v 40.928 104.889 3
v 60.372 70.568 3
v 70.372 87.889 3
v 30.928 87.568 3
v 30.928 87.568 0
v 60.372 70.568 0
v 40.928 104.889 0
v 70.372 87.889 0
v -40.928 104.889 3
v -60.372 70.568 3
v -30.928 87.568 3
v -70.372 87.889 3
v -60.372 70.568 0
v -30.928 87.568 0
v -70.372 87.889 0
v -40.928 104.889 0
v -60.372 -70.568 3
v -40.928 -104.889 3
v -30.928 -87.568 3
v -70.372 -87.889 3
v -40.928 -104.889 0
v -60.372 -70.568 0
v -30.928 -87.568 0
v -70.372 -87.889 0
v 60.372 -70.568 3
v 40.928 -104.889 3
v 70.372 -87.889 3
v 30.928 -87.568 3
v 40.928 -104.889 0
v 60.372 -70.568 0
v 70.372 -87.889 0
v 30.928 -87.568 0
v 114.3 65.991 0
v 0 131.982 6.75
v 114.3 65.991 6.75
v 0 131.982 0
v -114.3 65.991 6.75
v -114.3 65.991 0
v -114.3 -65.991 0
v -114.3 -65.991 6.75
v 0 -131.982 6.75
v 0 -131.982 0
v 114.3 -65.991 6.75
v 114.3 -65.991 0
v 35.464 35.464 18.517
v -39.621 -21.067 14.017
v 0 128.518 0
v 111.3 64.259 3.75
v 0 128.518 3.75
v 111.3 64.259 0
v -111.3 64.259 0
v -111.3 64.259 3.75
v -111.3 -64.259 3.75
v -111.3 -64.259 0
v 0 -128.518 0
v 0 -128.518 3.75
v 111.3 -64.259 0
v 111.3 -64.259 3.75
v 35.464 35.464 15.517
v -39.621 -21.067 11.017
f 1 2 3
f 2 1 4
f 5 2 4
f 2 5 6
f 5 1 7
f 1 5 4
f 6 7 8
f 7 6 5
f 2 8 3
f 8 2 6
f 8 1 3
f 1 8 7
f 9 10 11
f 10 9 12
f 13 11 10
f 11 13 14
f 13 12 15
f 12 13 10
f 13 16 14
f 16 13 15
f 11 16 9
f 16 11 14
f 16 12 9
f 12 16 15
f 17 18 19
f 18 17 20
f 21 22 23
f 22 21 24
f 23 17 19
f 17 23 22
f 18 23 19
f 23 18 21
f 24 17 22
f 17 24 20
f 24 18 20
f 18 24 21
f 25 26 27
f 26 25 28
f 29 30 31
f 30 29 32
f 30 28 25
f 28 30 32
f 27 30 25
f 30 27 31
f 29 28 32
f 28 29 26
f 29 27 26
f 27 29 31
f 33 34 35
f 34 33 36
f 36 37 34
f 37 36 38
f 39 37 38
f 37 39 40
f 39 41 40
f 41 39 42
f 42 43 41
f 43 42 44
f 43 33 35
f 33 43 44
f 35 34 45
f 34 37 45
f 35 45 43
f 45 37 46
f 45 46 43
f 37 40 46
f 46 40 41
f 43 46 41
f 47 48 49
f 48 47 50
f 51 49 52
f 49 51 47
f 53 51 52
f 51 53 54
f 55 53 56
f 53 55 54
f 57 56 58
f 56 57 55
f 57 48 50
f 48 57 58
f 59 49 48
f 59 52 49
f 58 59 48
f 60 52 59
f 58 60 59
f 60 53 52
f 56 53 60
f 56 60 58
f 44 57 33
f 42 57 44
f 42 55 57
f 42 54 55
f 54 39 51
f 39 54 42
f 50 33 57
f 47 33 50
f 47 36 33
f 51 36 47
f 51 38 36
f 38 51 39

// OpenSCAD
/*
    parametric_faceted_hex_wall_tile_mount_v22_hidden_tabs.scad
    ------------------------------------------------------------
    Improved asymmetric low-poly hex wall tile.

    Major v22 changes
    -----------------
    1. ONE master thickness control drives the whole part:
       master_thickness_mm

    2. FIXED mounting tabs showing through the front face.
       - edge height now automatically provides enough cavity depth
         for the full mounting-pad thickness
       - mounting tabs and ribs are also clipped against a safe volume
         below the underside of the faceted front shell
       - tabs therefore remain hidden inside the tile


       It controls:
       - faceted front shell thickness
       - perimeter wall thickness
       - mounting-tab thickness

       Optional multipliers allow advanced tuning without hiding the
       master control.

    2. Thicker shells now work automatically.
       The effective edge height is automatically raised when required
       so shell_thickness_mm is never blocked by a too-small edge height.

    3. Mounting pads cannot protrude outside the hexagon.
       Pads are intersected with a smaller inset hex footprint.

    4. Stronger default mounting geometry.
       - 3.0 mm pad thickness
       - 4.0 mm shell overlap
       - 3.0 mm edge inset
       - optional reinforcing ribs

    5. Open back remains truly open.
       There is no rear floor across the middle.

    Recommended use
    ---------------
    For a 9-inch decorative wall tile printed vertically:

        master_thickness_mm        = 3.0;
        front_shell_multiplier      = 1.0;
        perimeter_multiplier        = 1.0;
        mount_pad_multiplier        = 1.0;
        mount_pad_overlap_mm        = 4.0;
        mount_pad_edge_inset_mm     = 3.0;
        add_mount_ribs              = true;

    Export
    ------
    F6 Render
    File -> Export -> Export as STL
*/


// =============================================================================
// CUSTOMIZER PARAMETERS
// =============================================================================


/* [Tile Size] */

// Which dimension tile_size represents.
size_reference = "flat_to_flat";     // [flat_to_flat, across_corners]

// Units for tile_size.
size_units = "mm";                   // [mm, in]

// Examples:
// 152.4 = 6"
// 203.2 = 8"
// 228.6 = 9"
// 254.0 = 10"
tile_size = 228.6;

// Rotate finished tile around Z.
tile_rotation_deg = 0;


/* [MASTER THICKNESS] */

// MASTER MATERIAL THICKNESS.
//
// THIS is the main control to use if you want the whole printed part
// physically thicker / stronger.
//
// It directly drives:
//   - faceted front shell thickness
//   - perimeter wall thickness
//   - mounting pad thickness
//
// Recommended:
//   1.6 = light
//   2.0 = medium
//   2.5 = strong
//   3.0 = very strong / recommended for a robust wall tile
//   3.5 = heavy duty
//
master_thickness_mm = 3.0;

// Optional multipliers.
//
// Leave these at 1.0 unless you deliberately want one area stronger
// than the master value.
//
// Example:
// perimeter_multiplier = 1.20 makes a 3.0 mm master produce a
// 3.6 mm perimeter.
front_shell_multiplier = 1.0;
perimeter_multiplier   = 1.0;
mount_pad_multiplier   = 1.0;

// Derived thicknesses are calculated later from the master control.


/* [Front Relief] */

// proportional = scales with tile size
// absolute     = exact millimeter heights below
relief_height_mode = "proportional";    // [proportional, absolute]

// Overall relief multiplier.
relief_scale = 1.0;

// Main peak height relative to flat-to-flat size.
peak_height_ratio = 0.081;

// Ridge height relative to peak.
ridge_to_peak_ratio = 0.757;

// Requested outer edge height relative to peak.
//
// IMPORTANT:
// v21 automatically raises edge height if necessary to fit the selected
// front shell thickness. You normally do NOT need to change this anymore.
edge_to_peak_ratio = 0.097;

// Absolute values, used only in absolute mode.
peak_height_mm  = 18.5;
ridge_height_mm = 14.0;
edge_height_mm  = 1.8;

// Minimum empty clearance between the inner roof and Z=0 at the perimeter.
//
// v20 uses:
// effective_edge_height >= front_shell_thickness_mm + edge_clearance_mm
edge_clearance_mm = 0.60;


/* [Facet Layout] */

// Direction of main peak, CCW from +X.
peak_angle_deg = 45;

// Peak distance from center as a fraction of circumradius.
peak_radius_ratio = 0.38;

// Direction of secondary ridge.
ridge_angle_deg = 208;

// Ridge radial position.
ridge_radius_ratio = 0.34;


/* [Wall Mounting] */

// Enable mounting pads.
add_mount_pads = true;

// Width of each pad parallel to the corresponding hex side.
mount_pad_width_mm = 34.0;

// Radial depth of each pad.
mount_pad_depth_mm = 24.0;

// Mounting-tab thickness is now driven by master_thickness_mm.
// Use mount_pad_multiplier above only if the tabs need to be thicker
// or thinner than the rest of the tile.

// How far the pad reaches beneath the inner perimeter shell.
//
// More overlap creates a stronger pad-to-rim union.
mount_pad_overlap_mm = 4.0;

// Pull the ENTIRE usable pad footprint inward from the outside hex edge.
//
// Pads are clipped against this inset hex, so they cannot protrude outside.
mount_pad_edge_inset_mm = 3.0;

// Minimum air gap between the TOP of mounting geometry and the
// UNDERSIDE of the faceted front shell.
//
// This prevents tabs/ribs from becoming visible through the face.
// Recommended: 0.50-1.00 mm.
mount_face_clearance_mm = 0.75;

// Directions of mounting pads.
mount_pad_angles = [60, 120, 240, 300];


/* [Mount Reinforcement] */

// Add small triangular reinforcing ribs where pads meet the perimeter.
//
// Recommended ON for vertical printing.
add_mount_ribs = false;

// Rib thickness across the pad.
mount_rib_width_mm = 3.0;

// Rib height into the cavity.
mount_rib_height_mm = 5.0;

// Rib radial depth.
mount_rib_depth_mm = 8.0;


/* [Optional Screw Holes] */

add_pad_screw_holes = false;

// 3.5 ~= #6
// 4.5 ~= #8
pad_screw_hole_diameter_mm = 4.5;


/* [Advanced] */

// Polyhedron preview hint.
polyhedron_convexity = 12;

// Cylinder quality for screw holes.
screw_hole_fn = 40;


// =============================================================================
// DERIVED MATERIAL THICKNESSES
// =============================================================================
//
// These are the ACTUAL thicknesses used by the model.
//

front_shell_thickness_mm =
    master_thickness_mm * front_shell_multiplier;

perimeter_wall_thickness_mm =
    master_thickness_mm * perimeter_multiplier;

mount_pad_thickness_mm =
    master_thickness_mm * mount_pad_multiplier;


// =============================================================================
// DERIVED TILE DIMENSIONS
// =============================================================================

_tile_size_mm =
    size_units == "in"
        ? tile_size * 25.4
        : tile_size;

tile_flat_to_flat =
    size_reference == "flat_to_flat"
        ? _tile_size_mm
        : _tile_size_mm * cos(30);

tile_across_corners =
    tile_flat_to_flat / cos(30);

outer_apothem =
    tile_flat_to_flat / 2;

r_outer =
    outer_apothem / cos(30);

inner_apothem =
    outer_apothem - perimeter_wall_thickness_mm;

r_inner =
    inner_apothem / cos(30);

inner_flat_length =
    2 * inner_apothem * tan(30);

hex_side_length =
    2 * r_outer * sin(30);


// =============================================================================
// DERIVED RELIEF HEIGHTS
// =============================================================================

_peak_unscaled =
    relief_height_mode == "proportional"
        ? tile_flat_to_flat * peak_height_ratio
        : peak_height_mm;

_ridge_unscaled =
    relief_height_mode == "proportional"
        ? _peak_unscaled * ridge_to_peak_ratio
        : ridge_height_mm;

_requested_edge_unscaled =
    relief_height_mode == "proportional"
        ? _peak_unscaled * edge_to_peak_ratio
        : edge_height_mm;

peak_height =
    _peak_unscaled * relief_scale;

ridge_height =
    _ridge_unscaled * relief_scale;

requested_edge_height =
    _requested_edge_unscaled * relief_scale;

// AUTO-FIX:
// Guarantee enough vertical room for BOTH:
//   1. the chosen front-shell thickness
//   2. the full mounting-pad thickness
//
// This is the key v22 fix for tabs previously breaking through the face.
minimum_edge_height =
    front_shell_thickness_mm
    + mount_pad_thickness_mm
    + mount_face_clearance_mm;

edge_height =
    max(
        requested_edge_height,
        minimum_edge_height
    );


// =============================================================================
// DERIVED MOUNTING GEOMETRY
// =============================================================================

// Desired outer edge before clipping.
//
// This allows the pad to overlap the inner wall structurally.
mount_pad_desired_outer_r =
    inner_apothem + mount_pad_overlap_mm;

mount_pad_inner_r =
    mount_pad_desired_outer_r - mount_pad_depth_mm;

mount_pad_center_r =
    mount_pad_desired_outer_r - mount_pad_depth_mm / 2;

// Smaller hex used as a hard clipping boundary.
//
// Any mount geometry outside this boundary is removed automatically.
mount_clip_apothem =
    outer_apothem - mount_pad_edge_inset_mm;

mount_clip_radius =
    mount_clip_apothem / cos(30);


// =============================================================================
// VALIDATION
// =============================================================================

assert(
    tile_flat_to_flat > 0,
    "tile_size must produce a positive tile dimension."
);

assert(
    master_thickness_mm > 0,
    "master_thickness_mm must be greater than zero."
);

assert(
    front_shell_multiplier > 0 &&
    perimeter_multiplier > 0 &&
    mount_pad_multiplier > 0,
    "All thickness multipliers must be greater than zero."
);

assert(
    front_shell_thickness_mm > 0,
    "front_shell_thickness_mm must be greater than zero."
);

assert(
    perimeter_wall_thickness_mm > 0,
    "perimeter_wall_thickness_mm must be greater than zero."
);

assert(
    perimeter_wall_thickness_mm < outer_apothem,
    "perimeter_wall_thickness_mm is too large for this tile."
);

assert(
    inner_apothem > 0,
    "The selected perimeter wall leaves no hollow interior."
);

assert(
    edge_height > front_shell_thickness_mm,
    "Internal error: edge_height must exceed front_shell_thickness_mm."
);

assert(
    ridge_height > edge_height,
    "ridge_height must remain greater than the effective edge height."
);

assert(
    peak_height > ridge_height,
    "peak_height must remain greater than ridge_height."
);

assert(
    peak_radius_ratio > 0 && peak_radius_ratio < 0.90,
    "peak_radius_ratio must be between 0 and 0.90."
);

assert(
    ridge_radius_ratio > 0 && ridge_radius_ratio < 0.90,
    "ridge_radius_ratio must be between 0 and 0.90."
);

assert(
    mount_pad_width_mm > 0,
    "mount_pad_width_mm must be greater than zero."
);

assert(
    mount_pad_depth_mm > 0,
    "mount_pad_depth_mm must be greater than zero."
);

assert(
    mount_pad_thickness_mm > 0,
    "mount_pad_thickness_mm must be greater than zero."
);

assert(
    mount_pad_overlap_mm >= 0,
    "mount_pad_overlap_mm cannot be negative."
);

assert(
    mount_pad_edge_inset_mm >= 0,
    "mount_pad_edge_inset_mm cannot be negative."
);

assert(
    mount_face_clearance_mm >= 0,
    "mount_face_clearance_mm cannot be negative."
);

assert(
    mount_clip_apothem > 0,
    "mount_pad_edge_inset_mm is too large."
);

assert(
    mount_pad_inner_r > 0,
    "mount_pad_depth_mm is too large and reaches/passes the tile center."
);

assert(
    !add_pad_screw_holes ||
    pad_screw_hole_diameter_mm < mount_pad_width_mm * 0.75,
    "pad_screw_hole_diameter_mm is too large for the mounting pad."
);

assert(
    !add_mount_ribs ||
    mount_rib_height_mm > 0,
    "mount_rib_height_mm must be greater than zero."
);


// =============================================================================
// DIAGNOSTIC OUTPUT
// =============================================================================

echo("====================================================");
echo("FACETED HEX WALL TILE v22");
echo("====================================================");

echo(str("flat-to-flat             : ", tile_flat_to_flat, " mm"));
echo(str("across-corners           : ", tile_across_corners, " mm"));
echo(str("hex side length          : ", hex_side_length, " mm"));

echo(str("MASTER thickness         : ", master_thickness_mm, " mm"));
echo(str("actual front shell       : ", front_shell_thickness_mm, " mm"));
echo(str("actual perimeter wall    : ", perimeter_wall_thickness_mm, " mm"));
echo(str("actual mount pad         : ", mount_pad_thickness_mm, " mm"));
echo(str("perimeter wall thickness : ", perimeter_wall_thickness_mm, " mm"));

echo(str("requested edge height    : ", requested_edge_height, " mm"));
echo(str("minimum edge height      : ", minimum_edge_height, " mm"));
echo(str("EFFECTIVE edge height    : ", edge_height, " mm"));

echo(str("ridge height             : ", ridge_height, " mm"));
echo(str("peak height              : ", peak_height, " mm"));

echo(str("mount pad width          : ", mount_pad_width_mm, " mm"));
echo(str("mount pad depth          : ", mount_pad_depth_mm, " mm"));
echo(str("mount pad thickness      : ", mount_pad_thickness_mm, " mm"));
echo(str("mount pad overlap        : ", mount_pad_overlap_mm, " mm"));
echo(str("mount edge inset         : ", mount_pad_edge_inset_mm, " mm"));
echo(str("mount/face clearance     : ", mount_face_clearance_mm, " mm"));

echo(str("mount clip apothem       : ", mount_clip_apothem, " mm"));

if (edge_height > requested_edge_height)
    echo(
        str(
            "AUTO EDGE FIX ACTIVE: edge raised from ",
            requested_edge_height,
            " mm to ",
            edge_height,
            " mm so a ",
            front_shell_thickness_mm,
            " mm front shell and ", mount_pad_thickness_mm, " mm mounting tabs fit safely."
        )
    );

echo("====================================================");


// =============================================================================
// HELPERS
// =============================================================================

function polar(angle_deg, radius) =
    [
        radius * cos(angle_deg),
        radius * sin(angle_deg)
    ];

function hex_vertex(i, radius) =
    [
        radius * cos(30 + i * 60),
        radius * sin(30 + i * 60)
    ];


// =============================================================================
// FRONT RELIEF CONTROL POINTS
// =============================================================================

P_xy =
    polar(
        peak_angle_deg,
        r_outer * peak_radius_ratio
    );

Q_xy =
    polar(
        ridge_angle_deg,
        r_outer * ridge_radius_ratio
    );


// =============================================================================
// SHELL VERTICES
// =============================================================================

points =
    concat(

        // 0..5 : outer rear perimeter
        [
            for (i = [0 : 5])
                let(p = hex_vertex(i, r_outer))
                [p[0], p[1], 0]
        ],

        // 6..11 : outer front perimeter
        [
            for (i = [0 : 5])
                let(p = hex_vertex(i, r_outer))
                [p[0], p[1], edge_height]
        ],

        // 12..13 : outer peak / ridge
        [
            [P_xy[0], P_xy[1], peak_height],
            [Q_xy[0], Q_xy[1], ridge_height]
        ],

        // 14..19 : inner rear perimeter
        [
            for (i = [0 : 5])
                let(p = hex_vertex(i, r_inner))
                [p[0], p[1], 0]
        ],

        // 20..25 : inner front perimeter
        [
            for (i = [0 : 5])
                let(p = hex_vertex(i, r_inner))
                [p[0], p[1], edge_height - front_shell_thickness_mm]
        ],

        // 26..27 : inner peak / ridge
        [
            [P_xy[0], P_xy[1], peak_height - front_shell_thickness_mm],
            [Q_xy[0], Q_xy[1], ridge_height - front_shell_thickness_mm]
        ]
    );


// =============================================================================
// SHELL FACES
// =============================================================================

outer_roof_faces = [
    [6, 7, 12],
    [7, 8, 12],
    [6, 12, 11],

    [8, 13, 12],
    [11, 12, 13],

    [8, 9, 13],
    [9, 10, 13],
    [10, 11, 13]
];

inner_roof_faces = [
    [26, 21, 20],
    [26, 22, 21],
    [25, 26, 20],

    [26, 27, 22],
    [27, 26, 25],

    [27, 23, 22],
    [27, 24, 23],
    [27, 25, 24]
];

faces =
    concat(

        // Outer vertical perimeter
        [
            for (i = [0 : 5])
                [
                    i,
                    (i + 1) % 6,
                    6 + (i + 1) % 6,
                    6 + i
                ]
        ],

        outer_roof_faces,

        // Inner vertical perimeter
        [
            for (i = [0 : 5])
                [
                    14 + i,
                    20 + i,
                    20 + (i + 1) % 6,
                    14 + (i + 1) % 6
                ]
        ],

        inner_roof_faces,

        // Narrow rear perimeter ring only.
        // Center remains open.
        [
            for (i = [0 : 5])
                [
                    i,
                    14 + i,
                    14 + (i + 1) % 6,
                    (i + 1) % 6
                ]
        ]
    );


// =============================================================================
// TILE SHELL
// =============================================================================

module tile_shell() {
    polyhedron(
        points = points,
        faces = faces,
        convexity = polyhedron_convexity
    );
}


// =============================================================================
// SAFE MOUNTING VOLUME BELOW THE FRONT FACE
// =============================================================================
//
// This volume follows the UNDERSIDE of the faceted front shell, offset
// downward by mount_face_clearance_mm.
//
// Mount pads and ribs are intersected with this volume. Even if a future
// parameter combination becomes aggressive, mounting geometry cannot pass
// through the visible front shell.
//

safe_edge_z =
    max(
        0.01,
        edge_height
        - front_shell_thickness_mm
        - mount_face_clearance_mm
    );

safe_peak_z =
    max(
        0.01,
        peak_height
        - front_shell_thickness_mm
        - mount_face_clearance_mm
    );

safe_ridge_z =
    max(
        0.01,
        ridge_height
        - front_shell_thickness_mm
        - mount_face_clearance_mm
    );

safe_mount_points =
    concat(

        // 0..5: rear outer perimeter
        [
            for (i = [0 : 5])
                let(p = hex_vertex(i, r_outer))
                [p[0], p[1], 0]
        ],

        // 6..11: safe ceiling at outer perimeter
        [
            for (i = [0 : 5])
                let(p = hex_vertex(i, r_outer))
                [p[0], p[1], safe_edge_z]
        ],

        // 12..13: safe ceiling under peak/ridge
        [
            [P_xy[0], P_xy[1], safe_peak_z],
            [Q_xy[0], Q_xy[1], safe_ridge_z]
        ]
    );

safe_mount_ceiling_faces = [
    [6, 7, 12],
    [7, 8, 12],
    [6, 12, 11],
    [8, 13, 12],
    [11, 12, 13],
    [8, 9, 13],
    [9, 10, 13],
    [10, 11, 13]
];

safe_mount_faces =
    concat(

        // Outer side walls.
        [
            for (i = [0 : 5])
                [
                    i,
                    (i + 1) % 6,
                    6 + (i + 1) % 6,
                    6 + i
                ]
        ],

        // Sloped safe ceiling.
        safe_mount_ceiling_faces,

        // Rear floor used only as a clipping volume closure.
        [[5, 4, 3, 2, 1, 0]]
    );

module safe_mount_volume() {
    polyhedron(
        points = safe_mount_points,
        faces = safe_mount_faces,
        convexity = polyhedron_convexity
    );
}


// =============================================================================
// HEX FOOTPRINT USED TO CLIP MOUNTING TABS
// =============================================================================
//
// This is intentionally smaller than the visible outer hexagon.
// Therefore mount pads/ribs cannot stick out past the visible perimeter.
//

module mount_clip_volume(height_mm) {
    linear_extrude(height = height_mm)
        polygon(
            points = [
                for (i = [0 : 5])
                    hex_vertex(i, mount_clip_radius)
            ]
        );
}


// =============================================================================
// RAW MOUNT PAD
// =============================================================================

module raw_mount_pad(angle_deg) {
    rotate([0, 0, angle_deg])
        translate(
            [
                mount_pad_inner_r,
                -mount_pad_width_mm / 2,
                0
            ]
        )
            cube(
                [
                    mount_pad_depth_mm,
                    mount_pad_width_mm,
                    mount_pad_thickness_mm
                ]
            );
}


// =============================================================================
// CLIPPED MOUNT PAD
// =============================================================================

module mount_pad(angle_deg) {
    intersection() {

        raw_mount_pad(angle_deg);

        // Keep pad inside the inset hex footprint.
        mount_clip_volume(
            mount_pad_thickness_mm + 0.01
        );

        // Hard stop below the underside of the front face.
        safe_mount_volume();
    }
}


// =============================================================================
// OPTIONAL REINFORCING RIBS
// =============================================================================
//
// Two ribs are placed near the left/right sides of each mounting pad.
//
// They rise into the cavity and help resist bending at the pad-to-shell joint.
//

module raw_mount_ribs(angle_deg) {

    rib_center_r =
        mount_pad_desired_outer_r
        - mount_rib_depth_mm / 2;

    rib_side_offset =
        max(
            0,
            mount_pad_width_mm / 2
            - mount_rib_width_mm
            - 2
        );

    rotate([0, 0, angle_deg]) {

        for (side = [-1, 1]) {

            translate(
                [
                    rib_center_r - mount_rib_depth_mm / 2,
                    side * rib_side_offset - mount_rib_width_mm / 2,
                    mount_pad_thickness_mm
                ]
            )

            rotate([90, 0, 90])

            linear_extrude(height = mount_rib_depth_mm)

            polygon(
                points = [
                    [0, 0],
                    [mount_rib_width_mm, 0],
                    [mount_rib_width_mm, mount_rib_height_mm],
                    [0, 0]
                ]
            );
        }
    }
}


module mount_ribs(angle_deg) {
    intersection() {

        raw_mount_ribs(angle_deg);

        mount_clip_volume(
            mount_pad_thickness_mm
            + mount_rib_height_mm
            + 0.1
        );

        // Ribs are also prohibited from crossing the front-shell underside.
        safe_mount_volume();
    }
}


// =============================================================================
// OPTIONAL SCREW HOLE
// =============================================================================

module pad_screw_hole(angle_deg) {

    rotate([0, 0, angle_deg])

        translate(
            [
                mount_pad_center_r,
                0,
                -1
            ]
        )

            cylinder(
                d = pad_screw_hole_diameter_mm,
                h =
                    mount_pad_thickness_mm
                    + mount_rib_height_mm
                    + 2,
                $fn = screw_hole_fn
            );
}


// =============================================================================
// COMPLETE MODEL
// =============================================================================

module model() {

    rotate([0, 0, tile_rotation_deg]) {

        difference() {

            union() {

                tile_shell();

                if (add_mount_pads) {

                    for (a = mount_pad_angles) {

                        mount_pad(a);

                        if (add_mount_ribs)
                            mount_ribs(a);
                    }
                }
            }

            if (
                add_mount_pads &&
                add_pad_screw_holes
            ) {

                for (a = mount_pad_angles)
                    pad_screw_hole(a);
            }
        }
    }
}


// =============================================================================
// OUTPUT
// =============================================================================

model();
